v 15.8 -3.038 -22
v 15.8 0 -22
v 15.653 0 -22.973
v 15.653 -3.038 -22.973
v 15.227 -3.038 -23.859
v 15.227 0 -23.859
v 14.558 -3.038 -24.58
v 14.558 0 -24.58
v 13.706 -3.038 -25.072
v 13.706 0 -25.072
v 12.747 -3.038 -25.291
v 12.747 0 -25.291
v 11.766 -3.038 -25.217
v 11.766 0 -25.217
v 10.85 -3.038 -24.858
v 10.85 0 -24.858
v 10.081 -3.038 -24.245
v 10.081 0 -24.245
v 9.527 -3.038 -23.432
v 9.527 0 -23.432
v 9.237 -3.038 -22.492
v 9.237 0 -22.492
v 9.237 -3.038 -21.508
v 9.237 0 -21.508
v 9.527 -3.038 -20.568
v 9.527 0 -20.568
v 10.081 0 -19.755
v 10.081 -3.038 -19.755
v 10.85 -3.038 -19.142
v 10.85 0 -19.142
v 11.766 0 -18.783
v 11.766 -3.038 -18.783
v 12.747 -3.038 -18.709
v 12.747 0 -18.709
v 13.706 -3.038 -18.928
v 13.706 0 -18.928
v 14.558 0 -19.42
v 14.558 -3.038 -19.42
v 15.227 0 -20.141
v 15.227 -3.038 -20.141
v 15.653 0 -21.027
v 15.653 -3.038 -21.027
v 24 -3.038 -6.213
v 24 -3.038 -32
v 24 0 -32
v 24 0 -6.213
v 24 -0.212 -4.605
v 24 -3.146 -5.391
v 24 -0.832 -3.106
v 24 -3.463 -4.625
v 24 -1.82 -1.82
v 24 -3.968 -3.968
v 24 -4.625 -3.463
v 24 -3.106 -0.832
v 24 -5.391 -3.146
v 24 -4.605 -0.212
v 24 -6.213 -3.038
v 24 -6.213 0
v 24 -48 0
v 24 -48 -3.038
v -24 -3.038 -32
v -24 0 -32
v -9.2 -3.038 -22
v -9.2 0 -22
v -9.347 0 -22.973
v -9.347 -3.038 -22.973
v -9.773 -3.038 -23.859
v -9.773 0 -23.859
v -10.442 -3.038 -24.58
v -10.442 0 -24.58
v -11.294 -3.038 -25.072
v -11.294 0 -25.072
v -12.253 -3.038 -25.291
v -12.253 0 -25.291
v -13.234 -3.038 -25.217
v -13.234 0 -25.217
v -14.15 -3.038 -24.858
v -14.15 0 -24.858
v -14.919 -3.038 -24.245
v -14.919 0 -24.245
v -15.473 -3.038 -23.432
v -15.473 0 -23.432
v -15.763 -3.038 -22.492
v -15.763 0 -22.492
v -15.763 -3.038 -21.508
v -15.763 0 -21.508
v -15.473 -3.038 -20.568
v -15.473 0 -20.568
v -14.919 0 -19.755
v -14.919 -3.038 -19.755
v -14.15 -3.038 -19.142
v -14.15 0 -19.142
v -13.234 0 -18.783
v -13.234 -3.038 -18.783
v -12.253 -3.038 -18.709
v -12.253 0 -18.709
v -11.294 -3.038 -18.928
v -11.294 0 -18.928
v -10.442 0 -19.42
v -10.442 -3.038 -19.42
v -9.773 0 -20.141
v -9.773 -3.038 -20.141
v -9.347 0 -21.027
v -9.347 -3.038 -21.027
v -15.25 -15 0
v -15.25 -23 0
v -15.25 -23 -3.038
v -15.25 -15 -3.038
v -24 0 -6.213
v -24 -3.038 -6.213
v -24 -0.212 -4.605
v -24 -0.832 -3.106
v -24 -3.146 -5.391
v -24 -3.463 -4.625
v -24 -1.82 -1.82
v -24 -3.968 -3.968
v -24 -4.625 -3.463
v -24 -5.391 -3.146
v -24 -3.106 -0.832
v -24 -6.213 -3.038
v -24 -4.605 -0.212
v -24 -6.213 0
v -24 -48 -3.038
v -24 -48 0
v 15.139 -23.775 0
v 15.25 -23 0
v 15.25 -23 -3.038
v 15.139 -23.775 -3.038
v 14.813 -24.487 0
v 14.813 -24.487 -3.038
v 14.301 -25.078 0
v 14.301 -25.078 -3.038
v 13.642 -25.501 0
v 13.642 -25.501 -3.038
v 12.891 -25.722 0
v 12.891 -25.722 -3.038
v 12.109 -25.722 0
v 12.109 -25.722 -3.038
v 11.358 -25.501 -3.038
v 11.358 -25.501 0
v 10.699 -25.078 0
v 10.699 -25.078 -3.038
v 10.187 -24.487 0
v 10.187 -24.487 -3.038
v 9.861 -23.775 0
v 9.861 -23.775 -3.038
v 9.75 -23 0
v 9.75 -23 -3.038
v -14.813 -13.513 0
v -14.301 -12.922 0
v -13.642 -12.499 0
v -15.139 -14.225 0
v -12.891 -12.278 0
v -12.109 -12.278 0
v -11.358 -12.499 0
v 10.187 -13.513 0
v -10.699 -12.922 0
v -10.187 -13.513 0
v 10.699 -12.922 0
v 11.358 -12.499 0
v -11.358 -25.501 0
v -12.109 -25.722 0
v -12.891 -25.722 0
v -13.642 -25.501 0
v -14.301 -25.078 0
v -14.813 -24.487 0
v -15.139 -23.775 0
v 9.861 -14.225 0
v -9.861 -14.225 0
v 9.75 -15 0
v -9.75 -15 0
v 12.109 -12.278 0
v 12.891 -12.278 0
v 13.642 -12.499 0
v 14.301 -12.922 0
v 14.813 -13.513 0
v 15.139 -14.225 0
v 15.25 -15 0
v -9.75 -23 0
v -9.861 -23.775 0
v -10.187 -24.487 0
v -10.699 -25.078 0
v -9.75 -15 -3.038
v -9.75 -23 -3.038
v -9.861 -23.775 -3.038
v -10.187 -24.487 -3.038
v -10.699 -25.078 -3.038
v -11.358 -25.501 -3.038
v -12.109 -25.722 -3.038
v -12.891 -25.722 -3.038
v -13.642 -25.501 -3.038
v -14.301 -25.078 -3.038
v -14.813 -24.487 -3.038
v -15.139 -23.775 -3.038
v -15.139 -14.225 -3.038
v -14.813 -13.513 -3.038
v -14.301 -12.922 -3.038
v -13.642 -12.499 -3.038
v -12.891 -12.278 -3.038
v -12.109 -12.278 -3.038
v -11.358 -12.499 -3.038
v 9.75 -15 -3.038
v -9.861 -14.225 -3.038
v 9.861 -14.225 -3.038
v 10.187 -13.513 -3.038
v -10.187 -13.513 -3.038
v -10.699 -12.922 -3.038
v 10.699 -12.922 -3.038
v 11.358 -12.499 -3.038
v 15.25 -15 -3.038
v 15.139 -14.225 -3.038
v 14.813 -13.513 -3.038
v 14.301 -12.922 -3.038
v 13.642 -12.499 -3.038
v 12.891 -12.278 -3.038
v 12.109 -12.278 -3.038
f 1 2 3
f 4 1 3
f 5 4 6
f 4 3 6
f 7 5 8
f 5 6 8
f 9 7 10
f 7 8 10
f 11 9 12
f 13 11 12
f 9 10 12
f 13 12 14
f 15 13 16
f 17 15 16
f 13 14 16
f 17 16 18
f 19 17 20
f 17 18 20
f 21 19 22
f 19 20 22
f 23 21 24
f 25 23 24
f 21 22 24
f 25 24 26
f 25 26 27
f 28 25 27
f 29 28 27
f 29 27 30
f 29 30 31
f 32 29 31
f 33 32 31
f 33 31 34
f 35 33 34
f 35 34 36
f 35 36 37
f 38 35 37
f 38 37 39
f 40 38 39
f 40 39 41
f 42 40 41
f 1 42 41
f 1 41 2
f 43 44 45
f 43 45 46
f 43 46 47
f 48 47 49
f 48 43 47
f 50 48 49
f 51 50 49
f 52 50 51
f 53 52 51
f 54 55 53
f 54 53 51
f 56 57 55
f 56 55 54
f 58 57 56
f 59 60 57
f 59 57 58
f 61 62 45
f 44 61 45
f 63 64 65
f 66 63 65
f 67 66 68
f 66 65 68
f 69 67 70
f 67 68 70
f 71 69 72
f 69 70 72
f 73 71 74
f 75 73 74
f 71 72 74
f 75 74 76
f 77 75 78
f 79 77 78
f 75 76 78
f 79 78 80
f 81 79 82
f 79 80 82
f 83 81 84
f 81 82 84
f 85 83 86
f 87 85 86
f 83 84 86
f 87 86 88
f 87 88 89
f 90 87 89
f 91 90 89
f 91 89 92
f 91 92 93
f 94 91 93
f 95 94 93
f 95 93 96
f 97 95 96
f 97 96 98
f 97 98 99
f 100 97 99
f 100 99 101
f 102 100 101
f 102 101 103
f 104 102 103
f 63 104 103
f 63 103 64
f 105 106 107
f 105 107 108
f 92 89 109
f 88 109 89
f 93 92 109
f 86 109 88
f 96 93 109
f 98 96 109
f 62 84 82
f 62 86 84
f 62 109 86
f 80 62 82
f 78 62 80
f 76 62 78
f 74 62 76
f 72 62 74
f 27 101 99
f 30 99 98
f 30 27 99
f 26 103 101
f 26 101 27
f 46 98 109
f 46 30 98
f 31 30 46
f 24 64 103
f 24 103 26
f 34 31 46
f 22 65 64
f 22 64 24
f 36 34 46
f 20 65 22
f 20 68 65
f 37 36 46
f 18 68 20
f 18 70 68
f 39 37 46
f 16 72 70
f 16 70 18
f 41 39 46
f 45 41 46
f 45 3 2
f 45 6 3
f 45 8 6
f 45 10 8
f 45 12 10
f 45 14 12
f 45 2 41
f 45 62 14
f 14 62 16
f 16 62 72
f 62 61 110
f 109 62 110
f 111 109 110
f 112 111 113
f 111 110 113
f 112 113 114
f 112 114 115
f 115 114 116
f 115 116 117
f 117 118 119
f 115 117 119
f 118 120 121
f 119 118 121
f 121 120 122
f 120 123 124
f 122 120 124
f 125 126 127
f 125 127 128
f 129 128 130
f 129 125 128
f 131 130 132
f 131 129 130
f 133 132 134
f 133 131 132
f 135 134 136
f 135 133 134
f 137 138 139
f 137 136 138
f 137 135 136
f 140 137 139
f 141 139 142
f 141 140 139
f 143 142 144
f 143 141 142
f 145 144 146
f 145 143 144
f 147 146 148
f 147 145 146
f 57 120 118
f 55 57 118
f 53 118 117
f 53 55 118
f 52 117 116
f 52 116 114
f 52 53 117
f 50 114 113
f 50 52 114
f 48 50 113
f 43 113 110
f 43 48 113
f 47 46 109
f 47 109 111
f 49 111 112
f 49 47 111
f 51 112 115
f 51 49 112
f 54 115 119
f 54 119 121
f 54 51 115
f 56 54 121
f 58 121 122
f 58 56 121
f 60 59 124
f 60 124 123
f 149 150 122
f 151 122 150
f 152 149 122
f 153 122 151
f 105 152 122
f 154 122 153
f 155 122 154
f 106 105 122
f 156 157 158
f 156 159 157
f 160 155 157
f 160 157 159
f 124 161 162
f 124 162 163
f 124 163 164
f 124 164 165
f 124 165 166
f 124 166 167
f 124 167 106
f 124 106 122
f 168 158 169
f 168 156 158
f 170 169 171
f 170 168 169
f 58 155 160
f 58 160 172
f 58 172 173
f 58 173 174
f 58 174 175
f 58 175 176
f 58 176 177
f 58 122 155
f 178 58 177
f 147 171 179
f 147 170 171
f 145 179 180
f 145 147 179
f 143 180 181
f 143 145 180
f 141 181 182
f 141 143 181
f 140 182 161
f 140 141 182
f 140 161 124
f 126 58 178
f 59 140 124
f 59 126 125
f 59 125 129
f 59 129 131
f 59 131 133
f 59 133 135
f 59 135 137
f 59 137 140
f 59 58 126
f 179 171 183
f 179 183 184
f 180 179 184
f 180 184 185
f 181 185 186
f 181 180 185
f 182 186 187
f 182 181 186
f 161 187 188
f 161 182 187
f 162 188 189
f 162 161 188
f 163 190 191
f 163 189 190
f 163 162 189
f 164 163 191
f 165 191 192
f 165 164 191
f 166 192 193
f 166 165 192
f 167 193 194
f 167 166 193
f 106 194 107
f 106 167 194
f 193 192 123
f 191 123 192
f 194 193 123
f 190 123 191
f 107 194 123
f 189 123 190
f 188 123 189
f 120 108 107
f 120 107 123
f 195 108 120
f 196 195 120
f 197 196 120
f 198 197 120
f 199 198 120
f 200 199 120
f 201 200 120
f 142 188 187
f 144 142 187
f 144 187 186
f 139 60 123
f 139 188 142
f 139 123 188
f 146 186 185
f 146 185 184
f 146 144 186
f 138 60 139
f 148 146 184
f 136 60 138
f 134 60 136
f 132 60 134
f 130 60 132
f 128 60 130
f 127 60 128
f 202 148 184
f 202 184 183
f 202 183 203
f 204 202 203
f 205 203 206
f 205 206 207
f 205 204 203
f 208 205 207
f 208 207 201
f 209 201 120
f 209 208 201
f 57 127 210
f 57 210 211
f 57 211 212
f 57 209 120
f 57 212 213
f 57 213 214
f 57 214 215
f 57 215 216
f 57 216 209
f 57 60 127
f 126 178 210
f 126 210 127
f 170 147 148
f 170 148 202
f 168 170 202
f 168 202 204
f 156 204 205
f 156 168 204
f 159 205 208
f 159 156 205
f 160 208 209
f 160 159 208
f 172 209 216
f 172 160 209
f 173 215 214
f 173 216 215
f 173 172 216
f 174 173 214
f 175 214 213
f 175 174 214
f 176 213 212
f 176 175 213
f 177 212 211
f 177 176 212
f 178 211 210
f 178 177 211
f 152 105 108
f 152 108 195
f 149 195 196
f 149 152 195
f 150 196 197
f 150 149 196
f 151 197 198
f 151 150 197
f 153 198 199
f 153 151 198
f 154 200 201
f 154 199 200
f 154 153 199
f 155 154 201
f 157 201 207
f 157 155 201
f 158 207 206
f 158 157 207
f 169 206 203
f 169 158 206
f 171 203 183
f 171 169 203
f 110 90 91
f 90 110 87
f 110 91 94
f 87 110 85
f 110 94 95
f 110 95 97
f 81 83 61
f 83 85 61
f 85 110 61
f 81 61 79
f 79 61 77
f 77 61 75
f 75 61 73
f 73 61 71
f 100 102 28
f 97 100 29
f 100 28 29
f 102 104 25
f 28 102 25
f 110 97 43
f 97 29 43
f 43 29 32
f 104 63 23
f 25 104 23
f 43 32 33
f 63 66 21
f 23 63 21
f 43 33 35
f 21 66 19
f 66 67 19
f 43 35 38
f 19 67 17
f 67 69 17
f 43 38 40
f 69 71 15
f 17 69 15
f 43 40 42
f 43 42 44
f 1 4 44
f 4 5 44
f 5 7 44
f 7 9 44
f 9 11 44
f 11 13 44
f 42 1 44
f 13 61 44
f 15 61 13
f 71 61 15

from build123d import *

# Parameters (mm, degrees)
SKETCH1_W                    = 48
SKETCH1_H                    = 32
BASE_FLANGE1_DEPTH           = 3.03784
EDGE_FLANGE1_STRIP_W         = 18.50136
EDGE_FLANGE1_STRIP_H         = 3.03784
EDGE_FLANGE1_STRIP_CUT_DEPTH = 48
EDGE_FLANGE1_DEPTH           = 48
M6_CLEARANCE_HOLE1_D         = 6.6
CUT_EXTRUDE1_DEPTH           = 63.481997407


# Sheet-metal steps are written as plain solids
with BuildPart() as part:
    # Sketch1 → Base-Flange1 (new body)
    with BuildSketch(Plane(origin=(0, 0, 0), x_dir=(1, 0, 0), z_dir=(0, 1, 0))):
        with Locations((0, 16)):
            Rectangle(SKETCH1_W, SKETCH1_H)
    extrude(amount=-BASE_FLANGE1_DEPTH)

    # Edge-Flange1 strip (across the edge) → Edge-Flange1 strip cut (cut)
    with BuildSketch(Plane(origin=(24, -3.03784, 0), x_dir=(0, 0, -1), z_dir=(-1, 0, 0))):
        with Locations((-3.03784, -1.51892)):
            Rectangle(EDGE_FLANGE1_STRIP_W, EDGE_FLANGE1_STRIP_H)
    extrude(amount=EDGE_FLANGE1_STRIP_CUT_DEPTH, mode=Mode.SUBTRACT)

    # Edge-Flange1 section (across the edge) → Edge-Flange1 (add)
    with BuildSketch(Plane(origin=(24, -3.03784, 0), x_dir=(0, 0, -1), z_dir=(-1, 0, 0))):
        with BuildLine():
            Line((0, 3.175), (0, 44.96216))
            Line((0, 44.96216), (3.03784, 44.96216))
            Line((3.03784, 44.96216), (3.03784, 3.175))
            ThreePointArc((3.03784, 3.175), (3.96777597, 0.92993597), (6.21284, 0))
            Line((6.21284, 0), (6.21284, -3.03784))
            ThreePointArc((6.21284, -3.03784), (1.819698706, -1.218141294), (0, 3.175))
        make_face()
    extrude(amount=EDGE_FLANGE1_DEPTH)

    # M6 Clearance Hole1 (through all)
    with Locations(Plane(origin=(0, -3.03784, 0), x_dir=(-1, 0, 0), z_dir=(0, -1, 0))):
        with Locations((12.5, 22), (-12.5, 22)):
            Hole(M6_CLEARANCE_HOLE1_D / 2)

    # Sketch13 → Cut-Extrude1 (cut, through all)
    with BuildSketch(Plane.XY):
        with BuildLine():
            Line((-9.75, -15), (-9.75, -23))
            ThreePointArc((-9.75, -23), (-12.5, -25.75), (-15.25, -23))
            Line((-15.25, -23), (-15.25, -15))
            ThreePointArc((-15.25, -15), (-12.5, -12.25), (-9.75, -15))
        make_face()
        with BuildLine():
            Line((15.25, -15), (15.25, -23))
            ThreePointArc((15.25, -23), (12.5, -25.75), (9.75, -23))
            Line((9.75, -23), (9.75, -15))
            ThreePointArc((9.75, -15), (12.5, -12.25), (15.25, -15))
        make_face()
    extrude(amount=-CUT_EXTRUDE1_DEPTH, mode=Mode.SUBTRACT)


solid = part.part
